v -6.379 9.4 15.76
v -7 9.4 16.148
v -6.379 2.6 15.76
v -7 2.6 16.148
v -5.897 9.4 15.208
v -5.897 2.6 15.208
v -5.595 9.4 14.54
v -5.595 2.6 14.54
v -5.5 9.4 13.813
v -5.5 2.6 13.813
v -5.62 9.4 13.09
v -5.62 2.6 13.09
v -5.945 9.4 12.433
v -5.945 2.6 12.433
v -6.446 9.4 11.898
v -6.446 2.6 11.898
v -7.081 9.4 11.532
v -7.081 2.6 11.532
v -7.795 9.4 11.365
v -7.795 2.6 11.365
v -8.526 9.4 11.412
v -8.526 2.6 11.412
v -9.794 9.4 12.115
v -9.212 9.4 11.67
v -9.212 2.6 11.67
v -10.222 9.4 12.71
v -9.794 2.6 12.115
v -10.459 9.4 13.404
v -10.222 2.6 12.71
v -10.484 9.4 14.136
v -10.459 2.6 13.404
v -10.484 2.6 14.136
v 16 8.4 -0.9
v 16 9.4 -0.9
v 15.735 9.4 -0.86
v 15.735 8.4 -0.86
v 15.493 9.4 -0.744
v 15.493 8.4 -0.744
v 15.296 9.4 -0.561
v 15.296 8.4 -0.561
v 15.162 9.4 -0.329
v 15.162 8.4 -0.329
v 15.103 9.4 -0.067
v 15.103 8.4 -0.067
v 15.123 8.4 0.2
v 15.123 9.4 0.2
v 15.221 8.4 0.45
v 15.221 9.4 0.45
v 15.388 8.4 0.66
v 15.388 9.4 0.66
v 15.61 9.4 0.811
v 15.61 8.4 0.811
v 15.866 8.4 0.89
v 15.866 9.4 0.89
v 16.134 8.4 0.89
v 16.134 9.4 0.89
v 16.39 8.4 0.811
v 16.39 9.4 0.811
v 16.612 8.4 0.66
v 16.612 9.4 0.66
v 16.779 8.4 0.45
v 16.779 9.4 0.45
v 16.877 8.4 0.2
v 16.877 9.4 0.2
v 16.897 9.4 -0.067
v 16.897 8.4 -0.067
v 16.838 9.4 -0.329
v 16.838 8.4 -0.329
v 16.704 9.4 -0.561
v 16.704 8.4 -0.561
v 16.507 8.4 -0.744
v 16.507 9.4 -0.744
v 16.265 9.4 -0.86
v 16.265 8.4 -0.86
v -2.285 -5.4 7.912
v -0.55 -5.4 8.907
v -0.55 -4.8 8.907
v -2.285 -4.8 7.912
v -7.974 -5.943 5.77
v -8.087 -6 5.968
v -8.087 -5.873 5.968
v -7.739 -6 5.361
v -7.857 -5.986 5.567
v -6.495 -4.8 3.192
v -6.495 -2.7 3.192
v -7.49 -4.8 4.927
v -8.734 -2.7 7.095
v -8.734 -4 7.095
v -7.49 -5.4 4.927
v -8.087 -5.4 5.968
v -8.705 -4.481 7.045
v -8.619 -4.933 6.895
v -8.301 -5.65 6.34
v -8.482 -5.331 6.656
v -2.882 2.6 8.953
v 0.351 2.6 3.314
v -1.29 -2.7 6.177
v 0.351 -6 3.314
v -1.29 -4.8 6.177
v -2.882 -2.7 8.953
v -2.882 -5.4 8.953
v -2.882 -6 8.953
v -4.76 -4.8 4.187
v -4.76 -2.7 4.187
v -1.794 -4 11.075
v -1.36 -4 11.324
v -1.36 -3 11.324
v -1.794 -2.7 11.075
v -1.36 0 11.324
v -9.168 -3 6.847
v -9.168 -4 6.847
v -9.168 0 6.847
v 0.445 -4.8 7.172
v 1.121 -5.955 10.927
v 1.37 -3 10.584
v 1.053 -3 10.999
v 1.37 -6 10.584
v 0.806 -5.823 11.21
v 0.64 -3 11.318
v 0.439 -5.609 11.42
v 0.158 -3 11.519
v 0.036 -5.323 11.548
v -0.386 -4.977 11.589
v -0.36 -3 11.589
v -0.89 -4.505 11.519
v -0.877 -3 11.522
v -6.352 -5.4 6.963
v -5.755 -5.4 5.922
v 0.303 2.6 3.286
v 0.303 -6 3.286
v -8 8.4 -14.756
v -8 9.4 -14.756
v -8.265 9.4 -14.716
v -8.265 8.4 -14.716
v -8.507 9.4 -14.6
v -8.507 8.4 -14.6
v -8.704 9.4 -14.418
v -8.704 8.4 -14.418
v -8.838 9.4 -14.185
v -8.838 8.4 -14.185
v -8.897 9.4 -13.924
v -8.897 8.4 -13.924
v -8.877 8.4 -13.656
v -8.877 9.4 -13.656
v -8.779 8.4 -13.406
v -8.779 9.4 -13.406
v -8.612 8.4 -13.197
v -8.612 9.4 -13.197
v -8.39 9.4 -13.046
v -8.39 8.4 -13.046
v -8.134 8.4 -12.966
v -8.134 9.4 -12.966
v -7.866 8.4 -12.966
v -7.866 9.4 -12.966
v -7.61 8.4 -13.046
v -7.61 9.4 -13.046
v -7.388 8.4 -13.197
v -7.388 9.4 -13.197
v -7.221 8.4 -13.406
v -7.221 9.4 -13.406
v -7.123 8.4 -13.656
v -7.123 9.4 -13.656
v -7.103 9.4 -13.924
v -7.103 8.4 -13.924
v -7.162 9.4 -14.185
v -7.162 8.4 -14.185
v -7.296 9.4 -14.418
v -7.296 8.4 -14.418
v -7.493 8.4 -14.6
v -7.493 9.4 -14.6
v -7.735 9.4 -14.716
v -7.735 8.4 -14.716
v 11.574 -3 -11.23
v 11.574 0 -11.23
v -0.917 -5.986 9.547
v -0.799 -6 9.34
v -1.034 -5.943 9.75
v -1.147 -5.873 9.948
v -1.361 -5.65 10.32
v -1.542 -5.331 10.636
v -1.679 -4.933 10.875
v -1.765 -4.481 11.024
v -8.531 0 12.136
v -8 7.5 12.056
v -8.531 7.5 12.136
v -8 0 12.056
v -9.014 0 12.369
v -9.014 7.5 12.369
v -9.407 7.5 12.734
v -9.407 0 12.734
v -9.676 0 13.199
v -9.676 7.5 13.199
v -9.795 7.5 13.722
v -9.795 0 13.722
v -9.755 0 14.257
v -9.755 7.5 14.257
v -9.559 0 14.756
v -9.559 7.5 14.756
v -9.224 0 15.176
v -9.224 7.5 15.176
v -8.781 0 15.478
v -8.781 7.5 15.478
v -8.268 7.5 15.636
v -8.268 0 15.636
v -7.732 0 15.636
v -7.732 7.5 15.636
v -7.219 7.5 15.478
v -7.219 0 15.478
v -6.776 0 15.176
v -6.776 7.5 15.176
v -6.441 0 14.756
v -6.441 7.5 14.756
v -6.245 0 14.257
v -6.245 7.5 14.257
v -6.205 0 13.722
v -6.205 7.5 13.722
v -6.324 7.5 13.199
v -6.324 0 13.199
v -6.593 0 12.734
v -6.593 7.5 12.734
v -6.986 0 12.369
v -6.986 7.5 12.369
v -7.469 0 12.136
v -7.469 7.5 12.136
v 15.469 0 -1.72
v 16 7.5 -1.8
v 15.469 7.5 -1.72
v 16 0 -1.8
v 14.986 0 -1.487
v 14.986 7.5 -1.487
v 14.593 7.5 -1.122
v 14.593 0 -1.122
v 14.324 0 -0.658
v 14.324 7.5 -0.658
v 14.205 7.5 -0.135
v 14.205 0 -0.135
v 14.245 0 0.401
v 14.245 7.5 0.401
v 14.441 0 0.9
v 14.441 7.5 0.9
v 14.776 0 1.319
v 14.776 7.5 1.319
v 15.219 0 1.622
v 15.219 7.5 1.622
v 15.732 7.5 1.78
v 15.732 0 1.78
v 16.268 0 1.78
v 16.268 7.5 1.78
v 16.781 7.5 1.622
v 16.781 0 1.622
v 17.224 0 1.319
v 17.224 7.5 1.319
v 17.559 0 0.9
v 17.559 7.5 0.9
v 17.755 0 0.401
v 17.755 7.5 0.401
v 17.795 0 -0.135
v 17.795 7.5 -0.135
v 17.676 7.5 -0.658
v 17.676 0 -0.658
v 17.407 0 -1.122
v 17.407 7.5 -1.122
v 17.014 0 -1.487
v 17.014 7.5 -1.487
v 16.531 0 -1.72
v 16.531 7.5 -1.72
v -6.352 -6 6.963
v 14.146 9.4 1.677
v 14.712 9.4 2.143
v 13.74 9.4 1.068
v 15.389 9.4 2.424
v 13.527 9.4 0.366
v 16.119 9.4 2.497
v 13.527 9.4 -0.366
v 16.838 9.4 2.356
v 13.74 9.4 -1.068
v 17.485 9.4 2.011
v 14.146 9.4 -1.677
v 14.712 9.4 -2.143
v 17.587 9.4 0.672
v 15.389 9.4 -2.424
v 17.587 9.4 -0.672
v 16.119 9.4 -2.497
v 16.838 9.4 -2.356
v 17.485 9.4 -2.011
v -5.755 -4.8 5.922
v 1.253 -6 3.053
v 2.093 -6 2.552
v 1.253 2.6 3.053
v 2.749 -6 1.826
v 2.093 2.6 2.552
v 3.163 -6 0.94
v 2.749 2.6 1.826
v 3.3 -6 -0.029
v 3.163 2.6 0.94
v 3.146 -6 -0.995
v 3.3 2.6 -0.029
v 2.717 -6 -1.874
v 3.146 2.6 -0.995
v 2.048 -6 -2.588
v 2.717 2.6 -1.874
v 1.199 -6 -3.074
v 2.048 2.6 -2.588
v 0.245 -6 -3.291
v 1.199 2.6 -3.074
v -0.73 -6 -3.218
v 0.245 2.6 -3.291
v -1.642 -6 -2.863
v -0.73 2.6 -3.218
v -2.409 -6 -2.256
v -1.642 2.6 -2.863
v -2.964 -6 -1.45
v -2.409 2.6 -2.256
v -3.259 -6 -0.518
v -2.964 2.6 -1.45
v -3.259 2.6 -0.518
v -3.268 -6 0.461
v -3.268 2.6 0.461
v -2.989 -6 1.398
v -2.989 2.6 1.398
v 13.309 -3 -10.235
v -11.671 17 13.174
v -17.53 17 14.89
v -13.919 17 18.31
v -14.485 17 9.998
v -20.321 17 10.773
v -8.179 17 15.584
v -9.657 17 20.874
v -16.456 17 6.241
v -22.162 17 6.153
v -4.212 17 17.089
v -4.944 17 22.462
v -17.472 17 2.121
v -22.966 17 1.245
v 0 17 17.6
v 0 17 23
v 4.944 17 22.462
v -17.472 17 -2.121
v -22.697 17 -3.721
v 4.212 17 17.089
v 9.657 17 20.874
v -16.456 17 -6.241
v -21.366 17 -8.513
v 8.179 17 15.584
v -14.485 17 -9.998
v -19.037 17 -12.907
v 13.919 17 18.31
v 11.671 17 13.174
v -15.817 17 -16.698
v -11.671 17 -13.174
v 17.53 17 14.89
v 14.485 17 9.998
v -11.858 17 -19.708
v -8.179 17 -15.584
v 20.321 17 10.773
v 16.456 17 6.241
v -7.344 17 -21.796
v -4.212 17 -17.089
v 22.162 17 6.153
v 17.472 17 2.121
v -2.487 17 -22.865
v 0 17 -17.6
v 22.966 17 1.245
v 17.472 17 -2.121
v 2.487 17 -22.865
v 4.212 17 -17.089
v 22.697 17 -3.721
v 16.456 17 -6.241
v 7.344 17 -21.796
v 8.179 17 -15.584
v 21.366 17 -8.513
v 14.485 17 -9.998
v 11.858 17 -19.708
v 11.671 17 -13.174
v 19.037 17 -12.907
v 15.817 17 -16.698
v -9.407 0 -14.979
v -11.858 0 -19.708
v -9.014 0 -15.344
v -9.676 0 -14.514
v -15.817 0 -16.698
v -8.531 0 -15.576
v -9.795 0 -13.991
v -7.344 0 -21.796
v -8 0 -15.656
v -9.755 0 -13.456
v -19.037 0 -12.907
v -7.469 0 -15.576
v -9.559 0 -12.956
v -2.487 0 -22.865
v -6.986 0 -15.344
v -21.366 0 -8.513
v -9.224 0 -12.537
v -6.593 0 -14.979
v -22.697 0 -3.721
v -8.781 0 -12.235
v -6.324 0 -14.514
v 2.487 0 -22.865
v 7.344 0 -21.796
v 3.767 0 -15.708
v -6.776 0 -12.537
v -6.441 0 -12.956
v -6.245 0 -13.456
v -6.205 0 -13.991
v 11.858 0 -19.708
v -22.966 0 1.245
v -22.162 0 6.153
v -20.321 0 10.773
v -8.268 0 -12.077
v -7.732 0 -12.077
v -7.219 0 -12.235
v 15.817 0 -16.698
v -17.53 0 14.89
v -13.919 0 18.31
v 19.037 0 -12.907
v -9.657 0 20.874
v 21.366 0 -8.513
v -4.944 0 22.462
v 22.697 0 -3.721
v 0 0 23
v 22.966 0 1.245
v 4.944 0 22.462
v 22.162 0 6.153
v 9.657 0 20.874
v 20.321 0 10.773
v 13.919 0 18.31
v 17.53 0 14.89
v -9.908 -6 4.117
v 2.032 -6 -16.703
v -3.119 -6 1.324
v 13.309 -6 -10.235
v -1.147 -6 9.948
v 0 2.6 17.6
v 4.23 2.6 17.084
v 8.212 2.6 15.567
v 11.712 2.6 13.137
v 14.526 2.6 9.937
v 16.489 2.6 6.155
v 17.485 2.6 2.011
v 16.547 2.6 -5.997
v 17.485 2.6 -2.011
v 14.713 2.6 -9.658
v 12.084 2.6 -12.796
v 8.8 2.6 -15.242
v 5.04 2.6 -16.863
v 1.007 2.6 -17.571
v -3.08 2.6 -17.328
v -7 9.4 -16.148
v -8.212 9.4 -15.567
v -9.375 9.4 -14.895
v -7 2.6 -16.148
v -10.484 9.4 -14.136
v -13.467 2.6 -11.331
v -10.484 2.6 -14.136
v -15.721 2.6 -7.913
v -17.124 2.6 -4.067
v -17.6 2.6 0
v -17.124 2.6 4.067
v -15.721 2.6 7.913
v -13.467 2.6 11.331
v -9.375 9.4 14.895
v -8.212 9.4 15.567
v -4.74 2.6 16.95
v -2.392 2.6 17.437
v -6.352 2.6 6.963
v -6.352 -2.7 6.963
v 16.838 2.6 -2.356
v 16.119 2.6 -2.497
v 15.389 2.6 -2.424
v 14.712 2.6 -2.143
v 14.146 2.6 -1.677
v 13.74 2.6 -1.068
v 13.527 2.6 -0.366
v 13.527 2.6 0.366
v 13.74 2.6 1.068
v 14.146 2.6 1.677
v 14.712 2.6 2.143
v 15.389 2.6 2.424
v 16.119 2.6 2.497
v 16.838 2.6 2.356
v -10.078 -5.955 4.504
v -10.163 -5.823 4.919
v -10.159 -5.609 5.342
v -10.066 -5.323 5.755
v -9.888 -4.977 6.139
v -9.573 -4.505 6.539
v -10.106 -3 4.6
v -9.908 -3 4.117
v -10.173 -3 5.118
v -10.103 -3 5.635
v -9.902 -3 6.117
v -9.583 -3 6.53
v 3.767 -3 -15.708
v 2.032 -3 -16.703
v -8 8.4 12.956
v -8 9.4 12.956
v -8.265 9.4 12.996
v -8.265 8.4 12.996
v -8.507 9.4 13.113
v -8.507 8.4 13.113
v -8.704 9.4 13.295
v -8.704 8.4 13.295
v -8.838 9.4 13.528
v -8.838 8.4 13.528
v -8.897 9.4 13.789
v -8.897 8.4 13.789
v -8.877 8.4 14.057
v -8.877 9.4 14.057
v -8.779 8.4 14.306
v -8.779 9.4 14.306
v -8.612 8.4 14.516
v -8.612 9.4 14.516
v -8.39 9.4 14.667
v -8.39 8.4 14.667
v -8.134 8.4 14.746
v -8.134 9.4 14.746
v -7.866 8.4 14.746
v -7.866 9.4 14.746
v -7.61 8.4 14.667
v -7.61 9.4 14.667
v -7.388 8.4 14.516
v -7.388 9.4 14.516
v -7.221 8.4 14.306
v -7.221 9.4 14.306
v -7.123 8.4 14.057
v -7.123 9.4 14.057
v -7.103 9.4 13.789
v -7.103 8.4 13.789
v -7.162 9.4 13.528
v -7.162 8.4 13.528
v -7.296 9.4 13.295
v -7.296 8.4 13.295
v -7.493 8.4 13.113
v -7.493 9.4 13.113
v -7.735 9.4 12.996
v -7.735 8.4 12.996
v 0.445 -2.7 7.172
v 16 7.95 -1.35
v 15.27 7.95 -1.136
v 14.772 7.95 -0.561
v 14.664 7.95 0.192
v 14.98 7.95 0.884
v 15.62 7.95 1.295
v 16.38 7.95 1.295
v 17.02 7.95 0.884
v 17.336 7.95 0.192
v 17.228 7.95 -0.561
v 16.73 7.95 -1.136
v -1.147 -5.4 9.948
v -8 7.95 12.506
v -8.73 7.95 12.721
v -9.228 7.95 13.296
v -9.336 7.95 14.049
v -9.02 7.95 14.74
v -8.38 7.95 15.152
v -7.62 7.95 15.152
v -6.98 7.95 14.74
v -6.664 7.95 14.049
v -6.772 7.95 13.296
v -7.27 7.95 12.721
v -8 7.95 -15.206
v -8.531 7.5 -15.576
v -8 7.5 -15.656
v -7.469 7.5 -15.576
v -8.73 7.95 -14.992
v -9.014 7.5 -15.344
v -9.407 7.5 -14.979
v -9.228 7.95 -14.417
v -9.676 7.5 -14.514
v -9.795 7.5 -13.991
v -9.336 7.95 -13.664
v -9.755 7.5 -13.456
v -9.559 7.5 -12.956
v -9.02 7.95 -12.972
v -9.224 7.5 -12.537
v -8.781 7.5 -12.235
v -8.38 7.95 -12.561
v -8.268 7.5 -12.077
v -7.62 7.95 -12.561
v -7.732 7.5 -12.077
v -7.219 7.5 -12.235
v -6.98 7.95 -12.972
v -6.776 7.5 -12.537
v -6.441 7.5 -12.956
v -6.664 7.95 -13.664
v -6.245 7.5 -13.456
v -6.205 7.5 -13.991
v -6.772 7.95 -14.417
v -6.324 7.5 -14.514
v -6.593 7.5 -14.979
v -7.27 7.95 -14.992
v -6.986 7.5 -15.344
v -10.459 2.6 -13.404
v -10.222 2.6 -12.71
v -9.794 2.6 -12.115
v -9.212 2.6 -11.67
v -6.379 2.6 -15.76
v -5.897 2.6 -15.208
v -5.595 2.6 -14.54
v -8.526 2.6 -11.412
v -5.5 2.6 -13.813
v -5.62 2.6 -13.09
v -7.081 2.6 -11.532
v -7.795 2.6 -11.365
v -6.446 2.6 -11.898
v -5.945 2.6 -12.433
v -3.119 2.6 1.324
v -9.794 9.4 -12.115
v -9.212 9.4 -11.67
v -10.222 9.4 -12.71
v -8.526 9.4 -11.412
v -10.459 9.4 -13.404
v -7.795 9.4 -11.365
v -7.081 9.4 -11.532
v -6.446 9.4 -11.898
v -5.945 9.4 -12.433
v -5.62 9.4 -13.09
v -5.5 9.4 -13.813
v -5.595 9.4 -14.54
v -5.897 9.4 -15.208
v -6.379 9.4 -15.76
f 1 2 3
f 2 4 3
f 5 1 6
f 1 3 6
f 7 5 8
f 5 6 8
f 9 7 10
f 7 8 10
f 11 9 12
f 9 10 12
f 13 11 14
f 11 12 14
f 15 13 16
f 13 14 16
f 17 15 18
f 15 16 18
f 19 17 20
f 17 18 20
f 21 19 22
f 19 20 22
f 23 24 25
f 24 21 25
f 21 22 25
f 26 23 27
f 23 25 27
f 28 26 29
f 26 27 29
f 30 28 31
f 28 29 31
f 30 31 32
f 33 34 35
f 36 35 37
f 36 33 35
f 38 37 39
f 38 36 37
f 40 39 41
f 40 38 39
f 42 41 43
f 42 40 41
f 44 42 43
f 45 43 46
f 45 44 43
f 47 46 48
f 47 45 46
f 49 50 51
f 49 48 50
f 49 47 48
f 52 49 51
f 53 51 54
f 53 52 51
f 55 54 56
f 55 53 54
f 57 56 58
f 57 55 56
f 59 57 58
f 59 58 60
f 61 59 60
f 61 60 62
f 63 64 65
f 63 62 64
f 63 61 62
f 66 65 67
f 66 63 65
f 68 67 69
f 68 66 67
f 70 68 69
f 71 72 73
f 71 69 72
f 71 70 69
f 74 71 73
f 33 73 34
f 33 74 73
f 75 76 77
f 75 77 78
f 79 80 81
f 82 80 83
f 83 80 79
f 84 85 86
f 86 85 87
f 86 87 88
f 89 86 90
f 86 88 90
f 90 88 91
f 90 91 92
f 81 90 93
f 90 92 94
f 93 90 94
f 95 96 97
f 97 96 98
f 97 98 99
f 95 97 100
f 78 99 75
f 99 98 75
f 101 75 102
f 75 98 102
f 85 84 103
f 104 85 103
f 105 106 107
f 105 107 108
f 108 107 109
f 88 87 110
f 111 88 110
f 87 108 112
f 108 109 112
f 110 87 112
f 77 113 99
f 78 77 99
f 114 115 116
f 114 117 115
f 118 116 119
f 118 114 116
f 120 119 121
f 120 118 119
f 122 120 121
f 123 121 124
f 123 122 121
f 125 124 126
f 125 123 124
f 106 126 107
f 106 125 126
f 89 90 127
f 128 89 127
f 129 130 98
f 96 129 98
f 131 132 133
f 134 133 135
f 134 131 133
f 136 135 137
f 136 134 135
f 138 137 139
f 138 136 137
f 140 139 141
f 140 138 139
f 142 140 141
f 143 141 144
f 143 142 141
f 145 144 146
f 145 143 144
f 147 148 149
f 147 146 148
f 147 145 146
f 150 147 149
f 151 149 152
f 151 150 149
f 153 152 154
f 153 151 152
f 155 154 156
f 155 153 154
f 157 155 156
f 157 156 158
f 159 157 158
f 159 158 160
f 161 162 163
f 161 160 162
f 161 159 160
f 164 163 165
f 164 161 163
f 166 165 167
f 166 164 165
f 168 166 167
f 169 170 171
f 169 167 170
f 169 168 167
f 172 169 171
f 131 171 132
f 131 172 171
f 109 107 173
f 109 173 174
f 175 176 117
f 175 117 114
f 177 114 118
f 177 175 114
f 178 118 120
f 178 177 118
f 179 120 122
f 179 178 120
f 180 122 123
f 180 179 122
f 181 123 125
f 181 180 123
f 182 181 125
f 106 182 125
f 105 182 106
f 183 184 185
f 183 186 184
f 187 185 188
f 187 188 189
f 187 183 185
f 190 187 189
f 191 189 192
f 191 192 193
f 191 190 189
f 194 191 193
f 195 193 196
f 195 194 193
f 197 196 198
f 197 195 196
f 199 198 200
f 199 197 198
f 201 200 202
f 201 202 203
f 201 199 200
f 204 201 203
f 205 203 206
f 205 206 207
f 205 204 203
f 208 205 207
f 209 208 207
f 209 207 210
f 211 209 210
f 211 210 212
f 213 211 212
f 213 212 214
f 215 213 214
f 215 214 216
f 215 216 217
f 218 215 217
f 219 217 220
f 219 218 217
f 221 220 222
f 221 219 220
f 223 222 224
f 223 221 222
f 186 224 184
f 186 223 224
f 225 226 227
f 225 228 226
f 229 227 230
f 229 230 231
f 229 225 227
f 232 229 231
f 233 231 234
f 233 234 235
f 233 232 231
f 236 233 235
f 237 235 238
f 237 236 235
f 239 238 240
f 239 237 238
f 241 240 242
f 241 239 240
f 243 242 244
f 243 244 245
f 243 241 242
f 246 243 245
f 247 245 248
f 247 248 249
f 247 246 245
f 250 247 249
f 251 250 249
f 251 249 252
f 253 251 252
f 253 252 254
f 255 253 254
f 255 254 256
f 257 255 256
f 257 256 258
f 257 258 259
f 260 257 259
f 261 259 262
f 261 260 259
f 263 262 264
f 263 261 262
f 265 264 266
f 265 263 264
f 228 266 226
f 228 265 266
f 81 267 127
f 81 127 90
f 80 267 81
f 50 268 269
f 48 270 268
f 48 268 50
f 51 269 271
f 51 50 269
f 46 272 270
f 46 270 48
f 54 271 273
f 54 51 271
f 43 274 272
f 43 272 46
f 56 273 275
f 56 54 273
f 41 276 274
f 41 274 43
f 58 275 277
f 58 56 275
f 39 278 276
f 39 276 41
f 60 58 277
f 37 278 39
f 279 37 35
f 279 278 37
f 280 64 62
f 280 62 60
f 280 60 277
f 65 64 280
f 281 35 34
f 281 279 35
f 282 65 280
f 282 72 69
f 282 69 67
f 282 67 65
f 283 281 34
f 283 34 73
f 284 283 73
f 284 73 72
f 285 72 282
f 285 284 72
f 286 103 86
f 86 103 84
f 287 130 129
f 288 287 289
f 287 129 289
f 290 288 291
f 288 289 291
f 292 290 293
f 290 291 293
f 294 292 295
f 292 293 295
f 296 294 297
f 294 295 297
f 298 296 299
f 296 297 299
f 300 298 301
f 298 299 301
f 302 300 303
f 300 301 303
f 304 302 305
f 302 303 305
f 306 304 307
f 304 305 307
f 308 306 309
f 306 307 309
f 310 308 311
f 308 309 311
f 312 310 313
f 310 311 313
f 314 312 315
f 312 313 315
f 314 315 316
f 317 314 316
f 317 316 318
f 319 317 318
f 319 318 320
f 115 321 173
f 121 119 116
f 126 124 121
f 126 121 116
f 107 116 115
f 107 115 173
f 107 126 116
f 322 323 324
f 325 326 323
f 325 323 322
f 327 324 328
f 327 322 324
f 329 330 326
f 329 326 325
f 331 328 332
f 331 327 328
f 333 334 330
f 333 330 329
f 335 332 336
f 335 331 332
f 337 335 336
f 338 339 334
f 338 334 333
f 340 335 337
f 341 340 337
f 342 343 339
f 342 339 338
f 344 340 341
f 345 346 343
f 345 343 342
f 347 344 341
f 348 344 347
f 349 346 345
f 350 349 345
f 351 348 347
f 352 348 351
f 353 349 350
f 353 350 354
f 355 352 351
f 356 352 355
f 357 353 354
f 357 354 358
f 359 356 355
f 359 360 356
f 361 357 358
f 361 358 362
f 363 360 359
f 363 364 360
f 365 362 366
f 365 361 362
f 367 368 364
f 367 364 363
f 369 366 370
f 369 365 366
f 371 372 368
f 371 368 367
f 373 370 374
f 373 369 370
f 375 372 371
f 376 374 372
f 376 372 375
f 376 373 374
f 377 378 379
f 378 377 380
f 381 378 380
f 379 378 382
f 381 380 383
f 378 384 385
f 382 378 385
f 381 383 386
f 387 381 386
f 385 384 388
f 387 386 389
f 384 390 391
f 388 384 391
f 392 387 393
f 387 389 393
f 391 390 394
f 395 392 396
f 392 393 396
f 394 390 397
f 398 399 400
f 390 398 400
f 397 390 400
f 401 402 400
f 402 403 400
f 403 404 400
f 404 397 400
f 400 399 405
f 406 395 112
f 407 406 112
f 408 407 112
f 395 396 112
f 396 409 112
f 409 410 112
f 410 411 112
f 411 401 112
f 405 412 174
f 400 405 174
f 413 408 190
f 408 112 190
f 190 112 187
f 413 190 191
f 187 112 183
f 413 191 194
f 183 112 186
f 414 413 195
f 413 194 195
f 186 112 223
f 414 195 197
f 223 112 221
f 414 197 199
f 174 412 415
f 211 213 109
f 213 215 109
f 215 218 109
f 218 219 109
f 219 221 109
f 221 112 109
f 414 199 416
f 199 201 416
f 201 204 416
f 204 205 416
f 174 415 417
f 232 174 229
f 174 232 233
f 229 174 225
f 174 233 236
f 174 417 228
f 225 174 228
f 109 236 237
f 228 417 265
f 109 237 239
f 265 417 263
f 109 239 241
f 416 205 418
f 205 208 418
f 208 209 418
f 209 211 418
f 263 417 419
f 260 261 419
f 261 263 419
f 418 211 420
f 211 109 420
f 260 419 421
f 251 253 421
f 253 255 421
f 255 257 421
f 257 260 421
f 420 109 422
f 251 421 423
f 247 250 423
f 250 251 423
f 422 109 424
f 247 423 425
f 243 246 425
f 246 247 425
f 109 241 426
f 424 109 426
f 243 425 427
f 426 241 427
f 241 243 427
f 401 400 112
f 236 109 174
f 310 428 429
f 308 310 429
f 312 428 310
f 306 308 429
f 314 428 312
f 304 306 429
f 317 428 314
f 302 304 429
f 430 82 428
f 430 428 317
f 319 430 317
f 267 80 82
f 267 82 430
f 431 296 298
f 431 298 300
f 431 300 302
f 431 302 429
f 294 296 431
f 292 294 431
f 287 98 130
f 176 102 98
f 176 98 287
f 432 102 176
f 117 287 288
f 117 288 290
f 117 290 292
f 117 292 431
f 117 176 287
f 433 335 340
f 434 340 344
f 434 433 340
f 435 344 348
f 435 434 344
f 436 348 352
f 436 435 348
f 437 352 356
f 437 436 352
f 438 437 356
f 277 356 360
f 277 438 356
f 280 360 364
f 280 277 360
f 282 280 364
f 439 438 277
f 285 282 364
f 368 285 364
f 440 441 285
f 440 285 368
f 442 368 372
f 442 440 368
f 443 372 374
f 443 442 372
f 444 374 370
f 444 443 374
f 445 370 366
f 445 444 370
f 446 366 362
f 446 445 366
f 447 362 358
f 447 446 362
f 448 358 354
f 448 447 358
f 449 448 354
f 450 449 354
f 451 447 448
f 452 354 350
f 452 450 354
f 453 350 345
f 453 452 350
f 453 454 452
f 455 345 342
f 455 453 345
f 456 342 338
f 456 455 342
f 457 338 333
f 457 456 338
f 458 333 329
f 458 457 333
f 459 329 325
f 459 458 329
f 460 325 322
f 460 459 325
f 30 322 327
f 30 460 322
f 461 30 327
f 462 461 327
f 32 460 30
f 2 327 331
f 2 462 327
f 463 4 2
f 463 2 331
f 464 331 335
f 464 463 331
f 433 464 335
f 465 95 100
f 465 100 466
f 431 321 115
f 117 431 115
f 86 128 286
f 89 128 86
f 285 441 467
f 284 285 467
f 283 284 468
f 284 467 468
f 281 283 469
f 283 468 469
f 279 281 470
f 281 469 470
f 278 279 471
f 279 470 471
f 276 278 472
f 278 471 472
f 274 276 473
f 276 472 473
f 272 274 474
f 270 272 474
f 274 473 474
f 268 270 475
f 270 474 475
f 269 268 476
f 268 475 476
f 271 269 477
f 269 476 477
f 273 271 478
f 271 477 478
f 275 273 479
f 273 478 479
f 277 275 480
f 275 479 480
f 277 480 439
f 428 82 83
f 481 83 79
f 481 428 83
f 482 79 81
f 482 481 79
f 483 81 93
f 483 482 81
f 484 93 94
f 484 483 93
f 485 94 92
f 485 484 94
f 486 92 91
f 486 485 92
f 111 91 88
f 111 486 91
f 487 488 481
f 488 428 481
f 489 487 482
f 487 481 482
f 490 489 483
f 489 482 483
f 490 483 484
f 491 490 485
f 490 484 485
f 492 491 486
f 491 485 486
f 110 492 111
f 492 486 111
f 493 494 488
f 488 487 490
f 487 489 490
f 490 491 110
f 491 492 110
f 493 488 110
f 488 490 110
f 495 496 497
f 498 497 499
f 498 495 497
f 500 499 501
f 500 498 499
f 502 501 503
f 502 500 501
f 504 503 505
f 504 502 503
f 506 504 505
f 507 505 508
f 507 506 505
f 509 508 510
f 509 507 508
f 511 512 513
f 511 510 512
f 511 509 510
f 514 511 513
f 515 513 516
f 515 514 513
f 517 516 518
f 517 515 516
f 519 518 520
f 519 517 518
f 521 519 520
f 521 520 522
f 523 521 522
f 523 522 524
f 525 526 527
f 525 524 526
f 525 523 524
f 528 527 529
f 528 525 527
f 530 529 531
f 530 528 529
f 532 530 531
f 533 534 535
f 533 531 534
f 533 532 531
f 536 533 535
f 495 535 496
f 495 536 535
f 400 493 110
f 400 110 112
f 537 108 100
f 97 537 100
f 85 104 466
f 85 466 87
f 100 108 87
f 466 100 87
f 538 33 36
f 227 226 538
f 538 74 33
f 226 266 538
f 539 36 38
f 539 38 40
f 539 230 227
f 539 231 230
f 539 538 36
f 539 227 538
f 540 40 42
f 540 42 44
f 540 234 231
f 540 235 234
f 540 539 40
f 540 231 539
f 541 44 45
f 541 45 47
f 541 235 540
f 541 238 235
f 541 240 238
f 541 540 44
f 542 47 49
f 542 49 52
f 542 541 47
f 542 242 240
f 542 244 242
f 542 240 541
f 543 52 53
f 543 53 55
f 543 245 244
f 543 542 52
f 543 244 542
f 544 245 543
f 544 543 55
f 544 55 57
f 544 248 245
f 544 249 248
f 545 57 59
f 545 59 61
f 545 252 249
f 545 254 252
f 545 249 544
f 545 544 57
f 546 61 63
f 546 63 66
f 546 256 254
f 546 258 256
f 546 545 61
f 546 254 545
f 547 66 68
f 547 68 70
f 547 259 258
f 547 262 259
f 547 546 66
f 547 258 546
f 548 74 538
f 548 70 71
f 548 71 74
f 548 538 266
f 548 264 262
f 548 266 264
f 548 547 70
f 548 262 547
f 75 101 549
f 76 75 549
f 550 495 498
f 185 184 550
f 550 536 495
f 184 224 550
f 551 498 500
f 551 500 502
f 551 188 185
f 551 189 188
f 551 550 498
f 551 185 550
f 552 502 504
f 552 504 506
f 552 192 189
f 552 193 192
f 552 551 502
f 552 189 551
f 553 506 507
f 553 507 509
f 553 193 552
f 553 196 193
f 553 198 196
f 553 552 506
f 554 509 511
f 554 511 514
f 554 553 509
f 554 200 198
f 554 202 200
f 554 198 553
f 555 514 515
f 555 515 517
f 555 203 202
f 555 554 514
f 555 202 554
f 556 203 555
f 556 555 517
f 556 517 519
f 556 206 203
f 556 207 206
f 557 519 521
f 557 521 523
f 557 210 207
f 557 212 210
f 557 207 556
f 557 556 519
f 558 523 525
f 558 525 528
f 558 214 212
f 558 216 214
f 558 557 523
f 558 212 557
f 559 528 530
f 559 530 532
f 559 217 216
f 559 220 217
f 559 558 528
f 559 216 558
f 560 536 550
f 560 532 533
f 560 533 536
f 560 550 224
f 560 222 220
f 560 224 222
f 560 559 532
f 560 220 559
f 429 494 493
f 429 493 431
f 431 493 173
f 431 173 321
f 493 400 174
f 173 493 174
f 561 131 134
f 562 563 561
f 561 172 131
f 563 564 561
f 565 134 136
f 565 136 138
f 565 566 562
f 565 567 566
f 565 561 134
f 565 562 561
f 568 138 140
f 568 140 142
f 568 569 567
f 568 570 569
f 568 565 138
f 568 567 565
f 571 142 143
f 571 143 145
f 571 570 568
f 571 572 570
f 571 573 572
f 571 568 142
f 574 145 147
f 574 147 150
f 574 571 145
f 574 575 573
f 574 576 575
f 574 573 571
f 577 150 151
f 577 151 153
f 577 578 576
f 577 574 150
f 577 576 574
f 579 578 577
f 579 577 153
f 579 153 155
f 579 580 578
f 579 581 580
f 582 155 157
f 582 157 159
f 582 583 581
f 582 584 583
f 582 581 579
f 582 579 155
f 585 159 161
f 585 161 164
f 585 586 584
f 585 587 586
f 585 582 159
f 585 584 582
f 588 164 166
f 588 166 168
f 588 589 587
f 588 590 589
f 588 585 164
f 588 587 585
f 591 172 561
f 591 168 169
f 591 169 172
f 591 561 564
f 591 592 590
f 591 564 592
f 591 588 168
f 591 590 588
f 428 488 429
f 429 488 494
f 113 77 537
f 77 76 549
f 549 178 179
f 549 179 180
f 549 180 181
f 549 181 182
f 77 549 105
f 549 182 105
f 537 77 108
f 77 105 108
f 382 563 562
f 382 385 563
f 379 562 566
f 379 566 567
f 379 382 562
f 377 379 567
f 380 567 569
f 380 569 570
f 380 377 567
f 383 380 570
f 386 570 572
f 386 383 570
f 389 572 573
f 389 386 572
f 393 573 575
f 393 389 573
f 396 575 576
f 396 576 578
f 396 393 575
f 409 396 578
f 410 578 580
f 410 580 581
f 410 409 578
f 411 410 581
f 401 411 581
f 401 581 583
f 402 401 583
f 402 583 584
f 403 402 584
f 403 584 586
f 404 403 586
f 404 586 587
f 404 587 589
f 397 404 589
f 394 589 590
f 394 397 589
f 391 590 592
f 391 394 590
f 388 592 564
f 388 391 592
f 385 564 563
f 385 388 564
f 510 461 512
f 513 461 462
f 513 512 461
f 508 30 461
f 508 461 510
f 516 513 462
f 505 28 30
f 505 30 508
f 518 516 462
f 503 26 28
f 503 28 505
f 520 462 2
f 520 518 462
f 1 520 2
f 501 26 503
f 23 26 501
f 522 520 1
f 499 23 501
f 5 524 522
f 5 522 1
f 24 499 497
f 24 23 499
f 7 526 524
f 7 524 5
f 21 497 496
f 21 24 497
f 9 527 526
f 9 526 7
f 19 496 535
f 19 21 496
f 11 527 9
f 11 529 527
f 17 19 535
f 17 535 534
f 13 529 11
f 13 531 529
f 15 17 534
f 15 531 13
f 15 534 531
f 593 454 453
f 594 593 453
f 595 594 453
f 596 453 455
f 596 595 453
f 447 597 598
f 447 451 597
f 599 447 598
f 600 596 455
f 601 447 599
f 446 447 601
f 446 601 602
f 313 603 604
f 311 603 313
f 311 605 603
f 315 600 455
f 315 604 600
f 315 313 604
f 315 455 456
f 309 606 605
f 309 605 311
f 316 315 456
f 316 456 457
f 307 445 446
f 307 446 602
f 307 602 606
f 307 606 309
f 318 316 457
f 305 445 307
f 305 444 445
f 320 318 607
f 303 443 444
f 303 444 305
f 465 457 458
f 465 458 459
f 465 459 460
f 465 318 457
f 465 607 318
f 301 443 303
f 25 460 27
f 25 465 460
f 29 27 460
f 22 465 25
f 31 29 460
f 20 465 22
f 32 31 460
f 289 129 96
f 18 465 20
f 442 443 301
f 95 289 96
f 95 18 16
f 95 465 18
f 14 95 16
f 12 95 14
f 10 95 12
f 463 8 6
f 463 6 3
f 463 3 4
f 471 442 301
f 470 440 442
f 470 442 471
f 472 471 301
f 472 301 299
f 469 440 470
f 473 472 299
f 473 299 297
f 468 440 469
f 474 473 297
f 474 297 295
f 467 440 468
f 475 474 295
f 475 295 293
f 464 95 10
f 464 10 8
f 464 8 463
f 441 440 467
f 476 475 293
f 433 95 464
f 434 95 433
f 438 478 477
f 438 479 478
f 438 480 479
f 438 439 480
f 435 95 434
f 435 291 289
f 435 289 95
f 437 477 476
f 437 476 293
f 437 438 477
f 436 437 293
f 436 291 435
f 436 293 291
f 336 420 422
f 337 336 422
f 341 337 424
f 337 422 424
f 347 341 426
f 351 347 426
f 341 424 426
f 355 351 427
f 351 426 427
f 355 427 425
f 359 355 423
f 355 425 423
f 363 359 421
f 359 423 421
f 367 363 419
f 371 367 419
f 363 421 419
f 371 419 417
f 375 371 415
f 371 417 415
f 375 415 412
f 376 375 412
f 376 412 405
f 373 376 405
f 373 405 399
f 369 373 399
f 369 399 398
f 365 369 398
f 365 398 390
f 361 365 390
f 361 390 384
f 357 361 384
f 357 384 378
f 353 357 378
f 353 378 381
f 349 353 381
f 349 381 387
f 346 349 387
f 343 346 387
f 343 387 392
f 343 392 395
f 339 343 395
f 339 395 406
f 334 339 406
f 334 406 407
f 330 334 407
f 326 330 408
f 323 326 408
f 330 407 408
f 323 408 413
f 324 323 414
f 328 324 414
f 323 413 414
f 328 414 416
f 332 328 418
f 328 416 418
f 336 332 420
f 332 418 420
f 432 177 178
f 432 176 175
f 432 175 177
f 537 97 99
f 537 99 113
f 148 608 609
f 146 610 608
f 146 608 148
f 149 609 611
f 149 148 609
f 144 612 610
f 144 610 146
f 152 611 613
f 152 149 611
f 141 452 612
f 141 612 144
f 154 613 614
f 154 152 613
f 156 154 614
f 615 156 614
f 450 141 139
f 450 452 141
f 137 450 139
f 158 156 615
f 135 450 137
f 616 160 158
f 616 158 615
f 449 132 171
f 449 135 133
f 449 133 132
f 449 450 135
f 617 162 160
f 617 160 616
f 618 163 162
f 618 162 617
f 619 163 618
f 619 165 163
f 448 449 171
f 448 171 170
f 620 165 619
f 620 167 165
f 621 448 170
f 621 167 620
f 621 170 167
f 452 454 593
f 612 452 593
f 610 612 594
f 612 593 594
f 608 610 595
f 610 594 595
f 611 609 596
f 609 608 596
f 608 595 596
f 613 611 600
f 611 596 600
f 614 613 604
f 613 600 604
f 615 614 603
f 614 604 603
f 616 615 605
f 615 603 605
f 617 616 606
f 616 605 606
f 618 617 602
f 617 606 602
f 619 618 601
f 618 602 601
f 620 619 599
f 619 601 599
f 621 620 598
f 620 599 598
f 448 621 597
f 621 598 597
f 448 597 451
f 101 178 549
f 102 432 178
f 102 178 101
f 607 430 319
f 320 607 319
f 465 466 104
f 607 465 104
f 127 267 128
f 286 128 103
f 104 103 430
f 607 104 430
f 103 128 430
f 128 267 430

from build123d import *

# Parameters (mm, degrees)
SKETCH1_R                                    = 23
MAIN_BODY_DEPTH                              = 17
SHELL1_T                                     = -2.6
SKETCH22_R                                   = 20.400000000000006
SKETCH22_R_2                                 = 17.6
SIDE_PADDING_DEPTH                           = 14.4
SKETCH24_R                                   = 2.5000000000000004
SKETCH24_R_2                                 = 2.4999999999999982
SCREW_SUPPORTS_DEPTH                         = 6.8
CSK_SLOT_FOR_M1_6_COUNTERSUNK_FLAT_H_2_COUNT = 2
CSK_SLOT_FOR_M1_6_COUNTERSUNK_FLAT_H_2_PITCH = 27.712812921102078
CSK_SLOT_FOR_M1_6_COUNTERSUNK_FLAT_H_3_COUNT = 2
CSK_SLOT_FOR_M1_6_COUNTERSUNK_FLAT_H_3_PITCH = 27.712812921101964
CONNECTOR_BODY_DEPTH                         = 6
SKETCH29_W                                   = 1.9999999999999991
SKETCH29_H                                   = 3
CONNECTOR_CUTS_DEPTH                         = 47.00572879607992
FILLET2_R                                    = 2
POGO_HOLE_DEPTH                              = 4.5
POGO_TOP_SUPPORT_DEPTH                       = 0.6
POGO_BACK_SUPPORT_DEPTH                      = 0.6
MIDDLE_WIRE_CUT_DEPTH                        = 40.83716857408418
SKETCH35_R                                   = 3.3000000000000003
SLIP_RING_HOLE_DEPTH                         = 36.57189902155914


with BuildPart() as part:
    # Sketch1 → main body (new body)
    with BuildSketch(Plane(origin=(0, 0, 0), x_dir=(1, 0, 0), z_dir=(0, 1, 0))):
        with Locations(Location((0, 0, 0), (0, 0, 270))):
            Circle(SKETCH1_R)
    extrude(amount=MAIN_BODY_DEPTH)

    # Shell1
    shell1_openings = [part.faces().sort_by_distance(p)[0] for p in [
        (0, 17, 0),
    ]]
    offset(amount=SHELL1_T, openings=shell1_openings, kind=Kind.INTERSECTION)

    # Sketch22 → side padding (add)
    with BuildSketch(Plane(origin=(0, 2.6, 0), x_dir=(1, 0, 0), z_dir=(0, 1, 0))):
        Circle(SKETCH22_R)
        with Locations(Location((0, 0, 0), (0, 0, 270))):
            Circle(SKETCH22_R_2, mode=Mode.SUBTRACT)
    extrude(amount=SIDE_PADDING_DEPTH)

    # Sketch24 → screw supports (add)
    with BuildSketch(Plane(origin=(0, 2.6, 0), x_dir=(1, 0, 0), z_dir=(0, 1, 0))):
        with Locations((-8.000000000000066, 13.856406460550984)):
            Circle(SKETCH24_R)
        with Locations((16.00000000000061, 1.09033e-12)):
            Circle(SKETCH24_R_2)
        with Locations((-7.999999999998755, -13.856406460551078)):
            Circle(SKETCH24_R)
    extrude(amount=SCREW_SUPPORTS_DEPTH)

    # Sketch26 → CSK SLOT for M1.6 Countersunk Flat Head Screw2 (revolve, cut)
    with BuildSketch(Plane(origin=(-7.999999999999872, 0, 13.856406460551092), x_dir=(0, 0, -1), z_dir=(1, 0, 0))):
        Polygon((0, 0), (-4.16e-15, 17), (0.899999999999995, 17), (0.899999999999999, 8.4), (1.799999999999998, 7.5), (1.7999999999999996, -3.47e-15), align=None)
    csk_slot_for_m1_6_countersunk_flat_head = revolve(axis=Axis((-7.999999999999872, -6.349999999999991, 13.856406460551092), (0, 1, 0)), mode=Mode.SUBTRACT)

    # CSK SLOT for M1.6 Countersunk Flat H 2: CSK SLOT for M1.6 Countersunk Flat Head Screw2 ×2
    with Locations(*[(0, 0, -i * CSK_SLOT_FOR_M1_6_COUNTERSUNK_FLAT_H_2_PITCH) for i in range(1, CSK_SLOT_FOR_M1_6_COUNTERSUNK_FLAT_H_2_COUNT)]):
        add(csk_slot_for_m1_6_countersunk_flat_head, mode=Mode.SUBTRACT)

    # CSK SLOT for M1.6 Countersunk Flat H 3: CSK SLOT for M1.6 Countersunk Flat Head Screw2 ×2
    with Locations(*[Vector(0.8660254037844364, 0, -0.5000000000000041) * (i * CSK_SLOT_FOR_M1_6_COUNTERSUNK_FLAT_H_3_PITCH) for i in range(1, CSK_SLOT_FOR_M1_6_COUNTERSUNK_FLAT_H_3_COUNT)]):
        add(csk_slot_for_m1_6_countersunk_flat_head, mode=Mode.SUBTRACT)

    # Sketch28 → connector body (add)
    with BuildSketch(Plane.XZ):
        Polygon((2.0319134377332504, -16.7026098711818), (13.309106732280016, -10.235391659506115), (0.3746703089286471, 12.318994929587399), (-10.90252298561811, 5.8517767179117195), align=None)
    extrude(amount=CONNECTOR_BODY_DEPTH)

    # Sketch29 → connector cuts (cut, through all)
    with BuildSketch(Plane(origin=(-5.223545835654305, 0, 9.108543139189257), x_dir=(0.8674764072728275, 0, 0.4974783239750529), z_dir=(-0.4974783239750529, 0, 0.8674764072728275))):
        with Locations((-5.5465493958704535, -1.5)):
            Rectangle(SKETCH29_W, SKETCH29_H)
        Polygon((6.453450604129538, 1.59e-15), (6.453450604129538, -2.9999999999999982), (4.453450604129538, -2.9999999999999987), (4.453450604129538, 1.1e-15), align=None)
    extrude(amount=-CONNECTOR_CUTS_DEPTH, mode=Mode.SUBTRACT)

    # Fillet2
    fillet2_edges = [part.edges().sort_by_distance(p)[0] for p in [
        (-10.90252298561811, -4.5, 5.8517767179117195),
        (0.3746703089286471, -4.499999999999999, 12.318994929587399),
        (-5.263926338344731, -6, 9.08538582374956),
    ]]
    fillet(fillet2_edges, radius=FILLET2_R)

    # Sketch30 → pogo hole (cut)
    with BuildSketch(Plane(origin=(-5.223545835654305, 0, 9.108543139189257), x_dir=(0.8674764072728275, 0, 0.4974783239750529), z_dir=(-0.4974783239750529, 0, 0.8674764072728275))):
        Polygon((3.953450604129541, -2.6999999999999975), (-4.046549395870457, -2.7), (-4.046549395870457, -6), (3.953450604129543, -5.999999999999997), align=None)
    extrude(amount=-POGO_HOLE_DEPTH, mode=Mode.SUBTRACT)

    # Sketch31 → pogo top support (add)
    with BuildSketch(Plane.XZ.offset(6)):
        Polygon((-6.495179509548303, 3.1918286951216346), (0.44463174863431776, 7.171655286922058), (-1.1472988880858548, 9.947579790195107), (-8.087110146268472, 5.967753198394682), align=None)
    extrude(amount=-POGO_TOP_SUPPORT_DEPTH)

    # Sketch33 → pogo back support (add)
    with BuildSketch(Plane(origin=(0, -5.4, 0), x_dir=(1, 0, 0), z_dir=(0, 1, 0))):
        Polygon((-6.4951795095483025, -3.191828695121635), (0.44463174863431776, -7.171655286922058), (-0.5503248993157871, -8.906608101467711), (-7.490136157498408, -4.926781509667289), align=None)
    extrude(amount=POGO_BACK_SUPPORT_DEPTH)

    # Sketch34 → middle wire cut (cut, through all)
    with BuildSketch(Plane.XZ.offset(6)):
        Polygon((-6.352157331722817, 6.962709846344788), (-3.1185482258849735, 1.3241131990714121), (0.35135740320633424, 3.314026494971624), (-2.8822517026315113, 8.952623142245), align=None)
    extrude(amount=-MIDDLE_WIRE_CUT_DEPTH, mode=Mode.SUBTRACT)

    # Sketch35 → slip ring hole (cut, through all)
    with BuildSketch(Plane(origin=(0, 2.6, 0), x_dir=(1, 0, 0), z_dir=(0, 1, 0))):
        Circle(SKETCH35_R)
    extrude(amount=-SLIP_RING_HOLE_DEPTH, mode=Mode.SUBTRACT)


solid = part.part
